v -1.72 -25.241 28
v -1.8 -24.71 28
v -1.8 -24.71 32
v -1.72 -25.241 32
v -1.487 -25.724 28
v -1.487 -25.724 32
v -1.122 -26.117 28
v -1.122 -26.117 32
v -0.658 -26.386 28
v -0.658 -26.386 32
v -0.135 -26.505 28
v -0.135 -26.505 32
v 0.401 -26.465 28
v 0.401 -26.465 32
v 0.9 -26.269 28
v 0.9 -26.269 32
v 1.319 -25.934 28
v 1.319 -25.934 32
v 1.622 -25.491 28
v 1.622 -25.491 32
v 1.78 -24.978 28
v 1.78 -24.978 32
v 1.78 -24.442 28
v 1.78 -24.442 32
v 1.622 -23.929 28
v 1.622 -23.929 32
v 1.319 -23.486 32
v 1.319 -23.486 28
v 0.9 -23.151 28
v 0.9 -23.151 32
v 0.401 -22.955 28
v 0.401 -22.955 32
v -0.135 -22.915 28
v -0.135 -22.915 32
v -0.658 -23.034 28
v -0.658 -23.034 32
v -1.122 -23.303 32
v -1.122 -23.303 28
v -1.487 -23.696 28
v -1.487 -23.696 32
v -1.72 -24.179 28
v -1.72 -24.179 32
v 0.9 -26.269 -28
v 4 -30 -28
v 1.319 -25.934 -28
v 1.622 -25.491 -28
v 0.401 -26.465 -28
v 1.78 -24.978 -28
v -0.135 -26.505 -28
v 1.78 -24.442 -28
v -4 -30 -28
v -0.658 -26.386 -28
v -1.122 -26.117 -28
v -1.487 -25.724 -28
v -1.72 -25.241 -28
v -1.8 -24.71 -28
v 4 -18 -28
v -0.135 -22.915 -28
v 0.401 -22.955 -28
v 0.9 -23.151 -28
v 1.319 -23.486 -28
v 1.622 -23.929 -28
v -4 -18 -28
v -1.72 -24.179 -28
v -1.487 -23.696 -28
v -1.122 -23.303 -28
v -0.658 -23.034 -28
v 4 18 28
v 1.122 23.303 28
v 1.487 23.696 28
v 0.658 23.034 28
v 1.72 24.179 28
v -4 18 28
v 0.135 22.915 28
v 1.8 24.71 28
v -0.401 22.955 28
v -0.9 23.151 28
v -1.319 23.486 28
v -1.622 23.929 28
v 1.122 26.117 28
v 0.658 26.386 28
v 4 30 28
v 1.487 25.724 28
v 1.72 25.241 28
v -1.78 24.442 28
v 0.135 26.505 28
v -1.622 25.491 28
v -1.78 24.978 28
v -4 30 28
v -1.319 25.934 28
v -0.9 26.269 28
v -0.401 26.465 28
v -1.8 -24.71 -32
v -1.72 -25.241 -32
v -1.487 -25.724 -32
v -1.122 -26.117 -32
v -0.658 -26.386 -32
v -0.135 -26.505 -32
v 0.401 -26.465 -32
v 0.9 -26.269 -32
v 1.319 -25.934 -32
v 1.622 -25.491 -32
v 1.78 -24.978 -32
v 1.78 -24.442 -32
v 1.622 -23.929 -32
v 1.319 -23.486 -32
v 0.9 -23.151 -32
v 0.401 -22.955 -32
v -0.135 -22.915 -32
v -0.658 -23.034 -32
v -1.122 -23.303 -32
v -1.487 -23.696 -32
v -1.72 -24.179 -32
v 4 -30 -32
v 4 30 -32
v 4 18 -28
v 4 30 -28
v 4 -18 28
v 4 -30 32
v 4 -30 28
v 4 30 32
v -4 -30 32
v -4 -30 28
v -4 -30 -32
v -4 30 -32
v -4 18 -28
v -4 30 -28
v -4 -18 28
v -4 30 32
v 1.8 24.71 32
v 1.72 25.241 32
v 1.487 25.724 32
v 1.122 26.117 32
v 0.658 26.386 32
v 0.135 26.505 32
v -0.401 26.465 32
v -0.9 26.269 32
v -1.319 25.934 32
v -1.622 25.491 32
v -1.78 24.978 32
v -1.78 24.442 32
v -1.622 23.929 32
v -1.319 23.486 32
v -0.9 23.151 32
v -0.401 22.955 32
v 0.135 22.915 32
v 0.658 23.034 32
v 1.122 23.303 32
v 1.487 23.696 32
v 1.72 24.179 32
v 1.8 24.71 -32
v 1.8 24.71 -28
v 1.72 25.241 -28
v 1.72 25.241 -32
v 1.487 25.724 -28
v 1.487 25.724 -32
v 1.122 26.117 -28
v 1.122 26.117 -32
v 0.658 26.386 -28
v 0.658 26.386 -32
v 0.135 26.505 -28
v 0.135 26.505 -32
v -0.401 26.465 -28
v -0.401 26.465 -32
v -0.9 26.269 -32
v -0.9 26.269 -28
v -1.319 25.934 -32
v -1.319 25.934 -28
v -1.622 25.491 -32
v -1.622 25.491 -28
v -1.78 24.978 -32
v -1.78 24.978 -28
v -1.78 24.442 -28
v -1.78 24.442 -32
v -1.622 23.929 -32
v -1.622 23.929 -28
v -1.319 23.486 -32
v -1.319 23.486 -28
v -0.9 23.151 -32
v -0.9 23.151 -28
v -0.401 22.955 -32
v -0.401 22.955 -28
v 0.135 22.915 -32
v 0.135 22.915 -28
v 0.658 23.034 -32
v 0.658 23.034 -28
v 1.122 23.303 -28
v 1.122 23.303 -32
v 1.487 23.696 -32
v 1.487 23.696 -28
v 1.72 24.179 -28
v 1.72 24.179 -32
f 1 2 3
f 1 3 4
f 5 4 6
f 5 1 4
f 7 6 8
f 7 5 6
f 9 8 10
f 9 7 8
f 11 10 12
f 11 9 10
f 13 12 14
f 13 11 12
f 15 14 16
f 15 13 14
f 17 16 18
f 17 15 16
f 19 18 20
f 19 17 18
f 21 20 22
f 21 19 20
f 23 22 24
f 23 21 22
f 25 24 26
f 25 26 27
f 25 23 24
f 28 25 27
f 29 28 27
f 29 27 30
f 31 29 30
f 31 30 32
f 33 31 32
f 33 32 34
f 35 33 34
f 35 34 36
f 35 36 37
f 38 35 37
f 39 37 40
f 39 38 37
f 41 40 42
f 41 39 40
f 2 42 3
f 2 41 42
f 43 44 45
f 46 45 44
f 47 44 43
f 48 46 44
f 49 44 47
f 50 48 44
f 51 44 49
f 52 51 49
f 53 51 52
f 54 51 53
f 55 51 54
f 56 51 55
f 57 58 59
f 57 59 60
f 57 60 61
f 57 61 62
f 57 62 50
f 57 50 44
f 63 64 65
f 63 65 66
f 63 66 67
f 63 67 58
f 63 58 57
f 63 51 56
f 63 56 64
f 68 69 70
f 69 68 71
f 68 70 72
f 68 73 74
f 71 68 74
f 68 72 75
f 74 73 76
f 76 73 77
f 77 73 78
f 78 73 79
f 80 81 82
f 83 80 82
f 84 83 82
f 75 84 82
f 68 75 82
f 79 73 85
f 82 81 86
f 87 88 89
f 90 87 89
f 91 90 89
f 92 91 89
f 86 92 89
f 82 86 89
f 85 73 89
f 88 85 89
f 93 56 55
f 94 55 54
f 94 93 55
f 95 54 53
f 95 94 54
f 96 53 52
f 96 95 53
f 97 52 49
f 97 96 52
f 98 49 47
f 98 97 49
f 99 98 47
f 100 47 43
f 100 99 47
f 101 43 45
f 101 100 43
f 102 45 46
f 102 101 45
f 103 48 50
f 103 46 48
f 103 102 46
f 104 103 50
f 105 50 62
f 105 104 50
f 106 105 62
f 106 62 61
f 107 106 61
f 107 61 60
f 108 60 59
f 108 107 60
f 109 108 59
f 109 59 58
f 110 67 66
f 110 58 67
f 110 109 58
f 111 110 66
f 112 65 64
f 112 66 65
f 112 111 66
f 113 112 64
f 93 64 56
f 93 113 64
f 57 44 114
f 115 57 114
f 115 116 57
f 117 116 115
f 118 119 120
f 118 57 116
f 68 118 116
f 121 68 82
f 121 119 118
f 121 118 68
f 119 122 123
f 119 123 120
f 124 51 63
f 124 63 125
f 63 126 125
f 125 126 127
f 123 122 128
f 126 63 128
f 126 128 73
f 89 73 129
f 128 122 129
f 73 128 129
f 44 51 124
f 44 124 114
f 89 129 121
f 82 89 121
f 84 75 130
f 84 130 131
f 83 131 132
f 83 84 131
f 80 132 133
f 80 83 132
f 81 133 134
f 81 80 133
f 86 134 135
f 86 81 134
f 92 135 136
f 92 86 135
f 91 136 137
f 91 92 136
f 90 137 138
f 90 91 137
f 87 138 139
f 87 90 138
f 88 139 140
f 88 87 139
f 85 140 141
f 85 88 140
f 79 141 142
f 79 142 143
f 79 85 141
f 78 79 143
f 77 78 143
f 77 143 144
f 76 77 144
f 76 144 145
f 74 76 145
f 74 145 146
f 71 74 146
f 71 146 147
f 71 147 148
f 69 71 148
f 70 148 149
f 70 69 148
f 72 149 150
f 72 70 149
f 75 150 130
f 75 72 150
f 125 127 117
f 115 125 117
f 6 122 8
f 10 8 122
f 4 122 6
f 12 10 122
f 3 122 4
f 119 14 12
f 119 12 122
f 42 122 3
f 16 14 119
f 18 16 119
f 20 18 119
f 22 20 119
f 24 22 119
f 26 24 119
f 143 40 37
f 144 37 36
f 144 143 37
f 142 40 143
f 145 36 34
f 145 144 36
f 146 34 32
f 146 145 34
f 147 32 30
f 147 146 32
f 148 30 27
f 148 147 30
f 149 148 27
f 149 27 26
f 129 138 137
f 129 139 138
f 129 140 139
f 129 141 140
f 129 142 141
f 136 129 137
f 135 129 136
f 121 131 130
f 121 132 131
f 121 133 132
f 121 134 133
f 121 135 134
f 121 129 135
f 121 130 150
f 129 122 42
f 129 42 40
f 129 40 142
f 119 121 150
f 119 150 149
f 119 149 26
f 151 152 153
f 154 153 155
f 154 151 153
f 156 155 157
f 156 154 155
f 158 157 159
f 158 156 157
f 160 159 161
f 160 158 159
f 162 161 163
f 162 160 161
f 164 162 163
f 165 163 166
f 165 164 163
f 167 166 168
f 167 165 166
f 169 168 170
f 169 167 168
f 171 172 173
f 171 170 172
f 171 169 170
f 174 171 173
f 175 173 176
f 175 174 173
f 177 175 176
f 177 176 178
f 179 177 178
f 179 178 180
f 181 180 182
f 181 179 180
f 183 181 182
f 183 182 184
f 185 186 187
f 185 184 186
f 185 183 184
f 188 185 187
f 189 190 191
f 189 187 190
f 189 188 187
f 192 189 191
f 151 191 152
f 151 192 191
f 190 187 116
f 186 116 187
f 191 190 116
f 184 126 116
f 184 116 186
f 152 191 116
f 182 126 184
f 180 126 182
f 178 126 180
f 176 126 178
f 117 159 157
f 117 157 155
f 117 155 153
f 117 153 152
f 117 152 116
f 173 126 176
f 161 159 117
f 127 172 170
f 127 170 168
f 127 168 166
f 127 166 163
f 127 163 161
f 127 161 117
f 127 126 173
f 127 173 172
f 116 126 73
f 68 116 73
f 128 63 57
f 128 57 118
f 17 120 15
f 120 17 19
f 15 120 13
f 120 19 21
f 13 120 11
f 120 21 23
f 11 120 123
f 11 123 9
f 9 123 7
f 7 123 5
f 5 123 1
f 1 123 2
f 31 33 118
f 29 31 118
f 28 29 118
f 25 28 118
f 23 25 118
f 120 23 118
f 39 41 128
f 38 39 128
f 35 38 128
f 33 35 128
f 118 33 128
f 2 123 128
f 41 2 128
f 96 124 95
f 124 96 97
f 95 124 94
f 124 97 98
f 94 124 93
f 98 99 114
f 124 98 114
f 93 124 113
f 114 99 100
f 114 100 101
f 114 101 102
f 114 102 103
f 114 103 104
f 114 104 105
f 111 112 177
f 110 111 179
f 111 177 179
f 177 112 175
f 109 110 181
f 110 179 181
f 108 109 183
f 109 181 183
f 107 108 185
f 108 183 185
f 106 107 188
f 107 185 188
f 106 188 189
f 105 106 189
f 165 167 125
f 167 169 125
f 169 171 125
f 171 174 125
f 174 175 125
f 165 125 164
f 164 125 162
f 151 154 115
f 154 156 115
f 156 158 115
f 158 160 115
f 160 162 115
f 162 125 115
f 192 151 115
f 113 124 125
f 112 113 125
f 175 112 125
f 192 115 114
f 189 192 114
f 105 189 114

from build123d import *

# Parameters (mm, degrees)
SKETCH_1_W          = 8
SKETCH_1_H          = 60
SKETCH_1_R          = 1.8
EXTRUDE_1_DEPTH     = 32
SKETCH_2_W          = 56
SKETCH_2_H          = 12
CUT_EXTRUDE_1_DEPTH = 30


with BuildPart() as part:
    # 草图1 → 凸台-拉伸1 (new, symmetric)
    with BuildSketch(Plane.XY):
        Rectangle(SKETCH_1_W, SKETCH_1_H)
        with Locations((0, 24.71)):
            Circle(SKETCH_1_R, mode=Mode.SUBTRACT)
        with Locations((0, -24.71)):
            Circle(SKETCH_1_R, mode=Mode.SUBTRACT)
    extrude(amount=EXTRUDE_1_DEPTH, both=True)

    # 草图2 → 切除-拉伸1 (cut)
    with BuildSketch(Plane.ZY.offset(4)):
        with Locations((0, 24)):
            Rectangle(SKETCH_2_W, SKETCH_2_H)
        with Locations((0, -24)):
            Rectangle(SKETCH_2_W, SKETCH_2_H)
    extrude(amount=-CUT_EXTRUDE_1_DEPTH, mode=Mode.SUBTRACT)


solid = part.part
